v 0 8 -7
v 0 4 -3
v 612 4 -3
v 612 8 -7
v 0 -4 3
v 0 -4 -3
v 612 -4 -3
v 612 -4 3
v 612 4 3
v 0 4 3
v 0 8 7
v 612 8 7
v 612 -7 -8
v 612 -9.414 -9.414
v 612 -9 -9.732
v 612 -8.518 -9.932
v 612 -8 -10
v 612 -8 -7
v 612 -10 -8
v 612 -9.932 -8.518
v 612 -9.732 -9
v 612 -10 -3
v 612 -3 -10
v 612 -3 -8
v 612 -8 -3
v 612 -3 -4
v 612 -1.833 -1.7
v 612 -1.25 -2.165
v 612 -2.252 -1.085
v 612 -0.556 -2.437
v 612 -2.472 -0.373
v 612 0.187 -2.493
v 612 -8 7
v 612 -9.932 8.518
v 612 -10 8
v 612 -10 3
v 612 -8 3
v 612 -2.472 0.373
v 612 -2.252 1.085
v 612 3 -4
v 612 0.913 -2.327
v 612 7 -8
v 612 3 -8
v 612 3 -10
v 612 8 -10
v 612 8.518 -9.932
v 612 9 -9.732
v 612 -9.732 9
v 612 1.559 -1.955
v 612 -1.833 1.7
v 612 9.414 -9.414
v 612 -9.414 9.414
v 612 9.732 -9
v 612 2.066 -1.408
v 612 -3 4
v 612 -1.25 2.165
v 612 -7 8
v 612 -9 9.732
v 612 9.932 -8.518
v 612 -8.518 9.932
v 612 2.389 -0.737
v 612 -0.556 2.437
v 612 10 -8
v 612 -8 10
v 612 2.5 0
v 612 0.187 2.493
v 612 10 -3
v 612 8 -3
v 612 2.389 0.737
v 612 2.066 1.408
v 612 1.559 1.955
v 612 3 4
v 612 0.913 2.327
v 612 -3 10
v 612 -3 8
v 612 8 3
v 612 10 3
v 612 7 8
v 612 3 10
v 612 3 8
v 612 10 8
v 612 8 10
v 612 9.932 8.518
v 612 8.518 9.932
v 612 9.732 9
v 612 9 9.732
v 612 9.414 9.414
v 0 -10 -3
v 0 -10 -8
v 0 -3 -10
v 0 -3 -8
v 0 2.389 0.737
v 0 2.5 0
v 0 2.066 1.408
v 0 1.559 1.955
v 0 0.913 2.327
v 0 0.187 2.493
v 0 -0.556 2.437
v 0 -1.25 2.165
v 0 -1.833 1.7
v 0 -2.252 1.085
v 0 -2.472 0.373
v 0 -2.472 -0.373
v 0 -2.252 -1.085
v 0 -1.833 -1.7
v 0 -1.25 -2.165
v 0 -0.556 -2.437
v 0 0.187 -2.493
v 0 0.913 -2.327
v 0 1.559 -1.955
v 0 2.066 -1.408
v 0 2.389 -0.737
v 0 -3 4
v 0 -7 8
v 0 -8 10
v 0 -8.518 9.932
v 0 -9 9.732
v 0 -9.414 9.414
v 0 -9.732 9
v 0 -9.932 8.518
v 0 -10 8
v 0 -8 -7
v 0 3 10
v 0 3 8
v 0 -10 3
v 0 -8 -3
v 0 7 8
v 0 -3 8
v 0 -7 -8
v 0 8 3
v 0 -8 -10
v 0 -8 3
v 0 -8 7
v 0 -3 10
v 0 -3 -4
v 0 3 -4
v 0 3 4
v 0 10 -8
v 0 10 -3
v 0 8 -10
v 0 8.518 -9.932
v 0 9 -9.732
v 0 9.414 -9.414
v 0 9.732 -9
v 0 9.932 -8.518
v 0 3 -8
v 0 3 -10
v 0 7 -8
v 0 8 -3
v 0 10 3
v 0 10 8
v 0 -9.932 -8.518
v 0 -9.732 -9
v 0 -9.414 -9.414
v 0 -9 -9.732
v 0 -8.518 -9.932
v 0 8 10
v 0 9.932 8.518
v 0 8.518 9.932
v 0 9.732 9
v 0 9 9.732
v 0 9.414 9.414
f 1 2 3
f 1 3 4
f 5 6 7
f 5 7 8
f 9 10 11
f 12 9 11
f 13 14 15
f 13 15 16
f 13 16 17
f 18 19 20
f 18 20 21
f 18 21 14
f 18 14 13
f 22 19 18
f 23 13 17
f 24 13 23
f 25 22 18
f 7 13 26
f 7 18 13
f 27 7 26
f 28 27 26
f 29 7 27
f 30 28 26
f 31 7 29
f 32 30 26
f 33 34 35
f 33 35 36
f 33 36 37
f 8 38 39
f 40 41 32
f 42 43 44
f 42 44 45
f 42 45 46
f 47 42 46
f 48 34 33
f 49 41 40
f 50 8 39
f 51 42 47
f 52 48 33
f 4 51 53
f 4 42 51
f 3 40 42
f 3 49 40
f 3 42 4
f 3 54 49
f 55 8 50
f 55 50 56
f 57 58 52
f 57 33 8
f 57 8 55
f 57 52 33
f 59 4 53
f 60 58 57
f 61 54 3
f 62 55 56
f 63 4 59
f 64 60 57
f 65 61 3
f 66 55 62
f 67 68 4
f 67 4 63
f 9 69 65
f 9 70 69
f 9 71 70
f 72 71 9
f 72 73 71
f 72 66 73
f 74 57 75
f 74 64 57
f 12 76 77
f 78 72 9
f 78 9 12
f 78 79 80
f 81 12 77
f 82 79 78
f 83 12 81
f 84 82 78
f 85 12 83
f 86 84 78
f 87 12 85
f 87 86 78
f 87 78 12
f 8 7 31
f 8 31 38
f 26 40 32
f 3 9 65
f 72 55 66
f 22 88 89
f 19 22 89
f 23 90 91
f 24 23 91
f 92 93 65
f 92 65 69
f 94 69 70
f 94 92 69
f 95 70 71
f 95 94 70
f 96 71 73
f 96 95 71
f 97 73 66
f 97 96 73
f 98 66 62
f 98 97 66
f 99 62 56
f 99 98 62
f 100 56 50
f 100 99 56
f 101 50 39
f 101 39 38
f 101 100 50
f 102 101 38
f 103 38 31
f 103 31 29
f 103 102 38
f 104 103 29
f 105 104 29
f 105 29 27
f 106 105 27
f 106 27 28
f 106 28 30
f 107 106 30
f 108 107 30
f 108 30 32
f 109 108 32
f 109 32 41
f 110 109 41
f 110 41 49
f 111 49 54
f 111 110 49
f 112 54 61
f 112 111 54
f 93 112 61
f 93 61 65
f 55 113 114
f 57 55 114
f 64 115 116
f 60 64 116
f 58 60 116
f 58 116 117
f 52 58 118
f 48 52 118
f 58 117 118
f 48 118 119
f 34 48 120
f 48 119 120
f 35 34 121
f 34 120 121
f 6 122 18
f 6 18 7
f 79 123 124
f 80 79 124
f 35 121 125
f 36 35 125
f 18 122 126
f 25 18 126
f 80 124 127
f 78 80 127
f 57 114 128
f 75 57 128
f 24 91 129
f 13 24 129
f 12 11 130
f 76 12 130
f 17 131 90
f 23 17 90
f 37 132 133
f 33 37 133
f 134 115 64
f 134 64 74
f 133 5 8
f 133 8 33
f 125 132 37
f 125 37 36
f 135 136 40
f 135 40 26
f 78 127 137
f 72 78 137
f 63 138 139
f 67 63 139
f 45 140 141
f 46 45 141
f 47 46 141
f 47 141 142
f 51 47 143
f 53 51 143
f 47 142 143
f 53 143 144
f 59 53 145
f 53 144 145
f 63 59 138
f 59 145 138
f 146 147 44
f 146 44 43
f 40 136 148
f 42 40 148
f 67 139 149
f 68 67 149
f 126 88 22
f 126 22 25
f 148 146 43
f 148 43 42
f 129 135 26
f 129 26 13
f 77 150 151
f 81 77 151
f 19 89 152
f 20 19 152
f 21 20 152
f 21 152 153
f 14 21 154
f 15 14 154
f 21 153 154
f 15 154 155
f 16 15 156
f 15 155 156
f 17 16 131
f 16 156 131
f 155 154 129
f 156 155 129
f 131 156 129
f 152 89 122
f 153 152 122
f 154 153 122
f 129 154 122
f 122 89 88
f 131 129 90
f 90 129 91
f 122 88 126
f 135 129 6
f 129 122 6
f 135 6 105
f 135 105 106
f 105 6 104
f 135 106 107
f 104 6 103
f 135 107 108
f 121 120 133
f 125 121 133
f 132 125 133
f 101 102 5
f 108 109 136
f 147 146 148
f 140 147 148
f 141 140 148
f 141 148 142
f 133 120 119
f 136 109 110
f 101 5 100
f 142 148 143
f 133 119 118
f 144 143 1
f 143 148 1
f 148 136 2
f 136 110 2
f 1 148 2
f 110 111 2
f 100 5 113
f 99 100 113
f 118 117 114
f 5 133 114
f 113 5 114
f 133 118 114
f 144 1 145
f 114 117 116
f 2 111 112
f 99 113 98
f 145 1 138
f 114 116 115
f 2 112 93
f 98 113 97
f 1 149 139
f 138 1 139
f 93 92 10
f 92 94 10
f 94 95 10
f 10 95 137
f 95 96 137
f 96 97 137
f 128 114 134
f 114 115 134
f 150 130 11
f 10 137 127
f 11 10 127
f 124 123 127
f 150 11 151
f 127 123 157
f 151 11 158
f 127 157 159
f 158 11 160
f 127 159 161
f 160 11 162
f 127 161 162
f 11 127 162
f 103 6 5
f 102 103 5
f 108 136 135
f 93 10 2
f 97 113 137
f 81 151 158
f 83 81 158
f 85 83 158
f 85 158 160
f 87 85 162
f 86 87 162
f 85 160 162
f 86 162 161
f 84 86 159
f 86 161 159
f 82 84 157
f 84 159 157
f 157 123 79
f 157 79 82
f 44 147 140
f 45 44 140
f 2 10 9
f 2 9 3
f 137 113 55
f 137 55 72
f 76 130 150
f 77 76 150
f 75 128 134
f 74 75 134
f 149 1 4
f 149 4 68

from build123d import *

# Parameters (mm, degrees)
SKETCH_R  = 2.5
PAD_DEPTH = 612


with BuildPart() as part:
    # Sketch → Pad (new body)
    with BuildSketch(Plane.YZ):
        with BuildLine():
            ThreePointArc((-8, 10), (-9.414214, 9.414214), (-10, 8))
            Line((-10, 8), (-10, 3))
            Line((-8, 3), (-10, 3))
            Line((-8, 3), (-8, 7))
            Line((-4, 3), (-8, 7))
            Line((-4, -3), (-4, 3))
            Line((-8, -7), (-4, -3))
            Line((-8, -7), (-8, -3))
            Line((-10, -3), (-8, -3))
            Line((-10, -3), (-10, -8))
            ThreePointArc((-10, -8), (-9.414214, -9.414214), (-8, -10))
            Line((-8, -10), (-3, -10))
            Line((-3, -10), (-3, -8))
            Line((-3, -8), (-7, -8))
            Line((-3, -4), (-7, -8))
            Line((3, -4), (-3, -4))
            Line((3, -4), (7, -8))
            Line((3, -8), (7, -8))
            Line((3, -10), (3, -8))
            Line((3, -10), (8, -10))
            ThreePointArc((8, -10), (9.414214, -9.414214), (10, -8))
            Line((10, -8), (10, -3))
            Line((10, -3), (8, -3))
            Line((8, -7), (8, -3))
            Line((4, -3), (8, -7))
            Line((4, 3), (4, -3))
            Line((4, 3), (8, 7))
            Line((8, 7), (8, 3))
            Line((8, 3), (10, 3))
            Line((10, 3), (10, 8))
            ThreePointArc((10, 8), (9.414214, 9.414214), (8, 10))
            Line((3, 10), (8, 10))
            Line((3, 10), (3, 8))
            Line((3, 8), (7, 8))
            Line((7, 8), (3, 4))
            Line((-3, 4), (3, 4))
            Line((-3, 4), (-7, 8))
            Line((-7, 8), (-3, 8))
            Line((-3, 8), (-3, 10))
            Line((-8, 10), (-3, 10))
        make_face()
        Circle(SKETCH_R, mode=Mode.SUBTRACT)
    extrude(amount=PAD_DEPTH)


solid = part.part
